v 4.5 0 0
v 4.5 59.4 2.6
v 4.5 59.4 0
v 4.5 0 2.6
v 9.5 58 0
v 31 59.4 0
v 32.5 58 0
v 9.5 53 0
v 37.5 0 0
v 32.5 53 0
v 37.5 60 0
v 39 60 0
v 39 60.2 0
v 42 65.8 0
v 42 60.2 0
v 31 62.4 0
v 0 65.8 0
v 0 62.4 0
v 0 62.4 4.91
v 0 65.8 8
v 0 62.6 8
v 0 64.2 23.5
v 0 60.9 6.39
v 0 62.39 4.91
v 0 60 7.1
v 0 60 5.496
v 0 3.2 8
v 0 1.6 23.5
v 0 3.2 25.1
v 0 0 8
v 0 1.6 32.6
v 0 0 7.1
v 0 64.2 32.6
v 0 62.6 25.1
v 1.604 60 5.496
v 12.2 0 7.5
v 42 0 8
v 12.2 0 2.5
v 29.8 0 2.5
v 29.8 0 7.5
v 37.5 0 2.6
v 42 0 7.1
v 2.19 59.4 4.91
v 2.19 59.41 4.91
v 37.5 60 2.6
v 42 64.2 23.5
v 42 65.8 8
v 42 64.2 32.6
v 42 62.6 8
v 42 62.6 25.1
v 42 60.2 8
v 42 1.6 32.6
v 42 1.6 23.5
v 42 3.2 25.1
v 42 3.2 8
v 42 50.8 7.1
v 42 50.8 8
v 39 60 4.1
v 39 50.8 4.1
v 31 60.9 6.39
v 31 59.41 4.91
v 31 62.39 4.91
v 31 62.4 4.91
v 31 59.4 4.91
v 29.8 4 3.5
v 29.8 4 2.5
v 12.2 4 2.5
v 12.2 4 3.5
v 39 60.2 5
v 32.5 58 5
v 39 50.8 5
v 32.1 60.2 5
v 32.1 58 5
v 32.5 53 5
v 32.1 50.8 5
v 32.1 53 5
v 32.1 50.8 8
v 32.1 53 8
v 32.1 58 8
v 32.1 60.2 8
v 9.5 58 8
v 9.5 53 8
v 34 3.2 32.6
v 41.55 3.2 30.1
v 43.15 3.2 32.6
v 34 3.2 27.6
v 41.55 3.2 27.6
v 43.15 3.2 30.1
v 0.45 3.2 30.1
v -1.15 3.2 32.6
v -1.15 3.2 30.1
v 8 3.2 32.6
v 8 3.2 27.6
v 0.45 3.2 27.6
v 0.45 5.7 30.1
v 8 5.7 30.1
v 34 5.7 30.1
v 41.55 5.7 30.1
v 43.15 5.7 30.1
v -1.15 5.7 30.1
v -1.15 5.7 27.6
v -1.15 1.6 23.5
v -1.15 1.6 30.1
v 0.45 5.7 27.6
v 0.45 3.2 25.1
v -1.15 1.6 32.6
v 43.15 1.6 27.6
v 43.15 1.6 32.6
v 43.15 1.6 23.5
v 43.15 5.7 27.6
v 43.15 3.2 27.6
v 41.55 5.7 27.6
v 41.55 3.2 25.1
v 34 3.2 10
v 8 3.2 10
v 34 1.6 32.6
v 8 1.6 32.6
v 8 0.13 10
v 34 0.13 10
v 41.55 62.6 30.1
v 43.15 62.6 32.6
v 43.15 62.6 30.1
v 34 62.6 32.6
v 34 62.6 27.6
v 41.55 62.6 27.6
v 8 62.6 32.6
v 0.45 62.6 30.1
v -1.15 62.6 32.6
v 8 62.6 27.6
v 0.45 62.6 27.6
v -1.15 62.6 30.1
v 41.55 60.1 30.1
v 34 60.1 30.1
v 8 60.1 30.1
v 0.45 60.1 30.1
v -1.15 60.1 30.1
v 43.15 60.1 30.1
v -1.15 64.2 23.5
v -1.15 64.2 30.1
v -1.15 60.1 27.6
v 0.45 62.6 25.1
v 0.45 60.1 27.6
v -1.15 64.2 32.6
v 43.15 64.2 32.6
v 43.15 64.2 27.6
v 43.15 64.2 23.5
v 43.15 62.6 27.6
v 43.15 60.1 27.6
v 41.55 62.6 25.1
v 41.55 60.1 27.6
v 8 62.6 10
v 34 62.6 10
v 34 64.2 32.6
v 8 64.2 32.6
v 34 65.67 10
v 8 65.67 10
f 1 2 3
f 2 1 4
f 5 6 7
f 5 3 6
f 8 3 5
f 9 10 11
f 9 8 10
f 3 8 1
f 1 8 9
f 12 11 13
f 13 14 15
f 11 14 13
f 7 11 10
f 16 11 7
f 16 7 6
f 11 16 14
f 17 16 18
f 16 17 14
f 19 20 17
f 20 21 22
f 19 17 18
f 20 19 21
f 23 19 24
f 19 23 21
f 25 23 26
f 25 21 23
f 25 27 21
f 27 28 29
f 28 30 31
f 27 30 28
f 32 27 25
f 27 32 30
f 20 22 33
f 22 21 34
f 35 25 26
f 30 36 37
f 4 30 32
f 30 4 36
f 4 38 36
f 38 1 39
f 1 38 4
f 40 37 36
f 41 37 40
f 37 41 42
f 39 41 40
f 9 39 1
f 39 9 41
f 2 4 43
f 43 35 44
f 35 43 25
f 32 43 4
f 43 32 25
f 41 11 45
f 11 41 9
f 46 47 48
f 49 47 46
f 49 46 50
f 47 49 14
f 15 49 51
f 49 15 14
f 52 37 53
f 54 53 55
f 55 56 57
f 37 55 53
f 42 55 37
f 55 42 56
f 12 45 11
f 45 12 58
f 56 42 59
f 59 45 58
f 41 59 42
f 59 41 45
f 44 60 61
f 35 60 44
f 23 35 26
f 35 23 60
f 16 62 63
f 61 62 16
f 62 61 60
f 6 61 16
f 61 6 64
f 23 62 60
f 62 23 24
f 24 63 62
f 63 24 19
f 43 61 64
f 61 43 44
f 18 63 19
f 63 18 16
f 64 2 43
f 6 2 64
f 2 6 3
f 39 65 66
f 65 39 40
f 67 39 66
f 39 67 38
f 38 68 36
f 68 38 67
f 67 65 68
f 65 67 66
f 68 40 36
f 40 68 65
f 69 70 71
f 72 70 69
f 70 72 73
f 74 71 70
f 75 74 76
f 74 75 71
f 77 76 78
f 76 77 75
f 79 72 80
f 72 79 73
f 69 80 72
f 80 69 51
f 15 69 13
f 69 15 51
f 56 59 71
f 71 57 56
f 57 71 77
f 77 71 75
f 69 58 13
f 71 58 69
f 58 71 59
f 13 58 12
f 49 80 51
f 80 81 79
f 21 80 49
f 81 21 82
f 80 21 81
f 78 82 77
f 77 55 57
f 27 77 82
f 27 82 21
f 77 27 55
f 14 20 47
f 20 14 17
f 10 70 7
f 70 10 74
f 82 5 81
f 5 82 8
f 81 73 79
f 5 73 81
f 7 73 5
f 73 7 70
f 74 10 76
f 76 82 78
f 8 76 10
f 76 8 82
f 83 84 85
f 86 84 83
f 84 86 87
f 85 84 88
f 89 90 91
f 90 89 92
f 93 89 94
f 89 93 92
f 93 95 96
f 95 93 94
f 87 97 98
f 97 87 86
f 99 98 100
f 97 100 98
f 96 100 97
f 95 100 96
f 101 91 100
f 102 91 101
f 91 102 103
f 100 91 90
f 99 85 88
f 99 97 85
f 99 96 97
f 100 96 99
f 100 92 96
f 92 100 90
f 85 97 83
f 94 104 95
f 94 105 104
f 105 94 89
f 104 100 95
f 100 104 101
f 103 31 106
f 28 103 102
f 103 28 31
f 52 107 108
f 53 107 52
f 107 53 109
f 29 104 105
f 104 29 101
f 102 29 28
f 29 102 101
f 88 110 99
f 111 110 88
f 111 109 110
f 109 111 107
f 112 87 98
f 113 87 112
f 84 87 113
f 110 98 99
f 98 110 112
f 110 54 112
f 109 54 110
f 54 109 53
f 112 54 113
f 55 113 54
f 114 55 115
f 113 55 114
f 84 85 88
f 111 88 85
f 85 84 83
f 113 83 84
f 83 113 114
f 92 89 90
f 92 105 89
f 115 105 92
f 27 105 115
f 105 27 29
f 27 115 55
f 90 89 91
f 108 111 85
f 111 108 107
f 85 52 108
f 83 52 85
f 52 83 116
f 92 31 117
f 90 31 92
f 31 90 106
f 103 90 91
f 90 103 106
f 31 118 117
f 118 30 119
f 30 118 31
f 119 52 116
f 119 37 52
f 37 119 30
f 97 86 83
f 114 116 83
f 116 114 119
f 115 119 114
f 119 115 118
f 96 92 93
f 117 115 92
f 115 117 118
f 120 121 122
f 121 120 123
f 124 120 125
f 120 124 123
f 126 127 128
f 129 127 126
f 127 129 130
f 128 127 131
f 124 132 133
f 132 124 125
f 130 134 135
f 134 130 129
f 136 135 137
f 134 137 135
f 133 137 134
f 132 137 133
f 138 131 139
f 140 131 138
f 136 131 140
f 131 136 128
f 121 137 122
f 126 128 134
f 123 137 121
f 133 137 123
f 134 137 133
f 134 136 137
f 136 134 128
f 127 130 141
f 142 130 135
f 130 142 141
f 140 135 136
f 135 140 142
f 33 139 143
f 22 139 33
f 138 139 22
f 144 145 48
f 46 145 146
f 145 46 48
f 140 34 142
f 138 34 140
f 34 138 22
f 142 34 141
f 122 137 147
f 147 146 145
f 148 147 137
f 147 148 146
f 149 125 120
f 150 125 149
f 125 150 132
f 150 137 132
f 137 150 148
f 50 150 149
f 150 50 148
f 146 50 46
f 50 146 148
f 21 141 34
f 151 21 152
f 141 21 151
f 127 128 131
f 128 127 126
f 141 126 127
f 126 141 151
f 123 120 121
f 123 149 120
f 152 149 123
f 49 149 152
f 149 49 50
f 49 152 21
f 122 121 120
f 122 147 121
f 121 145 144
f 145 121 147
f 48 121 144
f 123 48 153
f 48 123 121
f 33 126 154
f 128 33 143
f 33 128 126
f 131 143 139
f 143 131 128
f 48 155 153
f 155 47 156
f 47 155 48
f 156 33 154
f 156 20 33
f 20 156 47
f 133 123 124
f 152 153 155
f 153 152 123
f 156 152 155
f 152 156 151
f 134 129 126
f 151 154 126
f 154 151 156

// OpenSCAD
/*
Generic Action Camera Adapter for 3DR Solo
Copyright (C) 2016 - 2017  Hugh Eaves

This program is free software: you can redistribute it and/or modify
it under the terms of the GNU General Public License as published by
the Free Software Foundation, either version 3 of the License, or
(at your option) any later version.

This program is distributed in the hope that it will be useful,
but WITHOUT ANY WARRANTY; without even the implied warranty of
MERCHANTABILITY or FITNESS FOR A PARTICULAR PURPOSE.  See the
GNU General Public License for more details.

You should have received a copy of the GNU General Public License
along with this program.  If not, see <http://www.gnu.org/licenses/>.
*/

/************************************************
 * PART SELECTION
 ************************************************/
 
// Select the part you would like to display
part = "adapter"; // [adapter:Adapter,retaining_clip:Retaining clip,back_weight:Back Weight,side_weight:Side Weight]

/********************
 * MAIN PARAMETERS *
 ********************/

// No-name SJ4000 clone
// camera_length = 59.8;
// camera_width = 40.8;
// camera_height = 25.6;

// The values below are for the GitUp Git2P

/* [Adapter Parameters] */
// Length of camera body (side to side)
camera_length = 59.4; // [57:62]
// Width of camera body (top to bottom)
camera_width = 41.1;  // [38:42]
// Height of camera body (front to back)
camera_height = 19.6;  // [15:40]

// Adapter arm bump size (How far out the "bumps" protrude on the ends of the arms)
adapter_arm_bump_size = 2.5; // [1:5]

/* [Back Weight Parameters] */
// The length of the counterbalance weight on the back of the camera. Larger values make it heavier.
back_weight_length = 29; // [10:40]

// The offset of the weight on the back of the gimbal. Values greater than zero move the weight to the outer side of the gimbal
back_weight_offset = 0; // [0:20]

/* [Side Weight Parameters] */
// The thickness of the side weight, thicker is heavier
side_weight_thickness = 4; // [4:8]

// The length of the side weight, longer is heavier
side_weight_length = 10; // [9:17]

/********************
 * OTHER PARAMETERS *
 ********************/
/* [Hidden] */

/* How much to shift the camera to the right to avoid the curved protrusion from the pitch motor housing */
camera_offset = 3.2;

/* Dimensions of the base of the camera adapter, so that it is a nice snug fit inside the 3DR gimbal mount */
base_height = 8;  // (thickness) thick enough to clear the GoPro plug in the back
base_width  = 42;
base_length = 60;

/* Dimensions of the small bracket that holds the camera adapter to the gimbal mount */
bracket_width = 9;
bracket_depth = 9.5;
bracket_thickness = 3;
bracket_radius = 2;

/* Typical values for M2 cap-head screws */
screw_thread_diameter = 2.5;
screw_head_diameter = 5;
screw_head_height = 3;

/* Dimensions of the "stud" that the 3DR balancing weights attach to */
stud_height = 2.5;
stud_diameter = 6.4;
stud_hole_diameter = 2;

bottom_lip_width = 4.5;
bottom_lip_height = 2.6;

// cutout for GoPro plug
plug_thickness = 5;
plug_width = 23;
plug_offset = 55.5 - (plug_thickness / 2);

// cutout for right side wall of "gimbal bracket"
side_wall_length = 31;
side_wall_height = 6.4;
side_wall_width = 3;
side_wall_offset = 59.4;

// height of hook on bottom left of "gimbal bracket"
hook_width = 17.6;
hook_height = 2.5; // distance from bottom
hook_length = 4;
hook_thickness = 1;

// width of protrusion on front of "pitch motor"
motor_protrusion_width = 20;

// thickness / length of camera retaining clips
clip_thickness = 1.6;
right_clip_opening_width =  26;
// left_clip_opening_width = motor_protrusion_width;
left_clip_opening_width = right_clip_opening_width;

x_midpoint = base_width / 2;
main_length = camera_length + camera_offset * 2;
camera_gap = (base_width - camera_width) / 2;

camera_height_adjustment = 0;

// more facets for smaller holes
$fn=16;

module lip_cutout() {
cube([bottom_lip_width, base_length, bottom_lip_height]);
  translate([0,0,bottom_lip_height])
  mirror([1,-1,0])
  wedge(base_length, bottom_lip_width, bottom_lip_width, false, false);
}


module side_wall_cutout() {
   translate ([0, side_wall_offset, 0]) {
      cutout_base_height = side_wall_height - (side_wall_width / 2);
      cube([side_wall_length, side_wall_width, cutout_base_height + 0.01]);
        translate([0,0,cutout_base_height])
        prism (side_wall_length, side_wall_width, side_wall_width / 2- 0.01);
    }
}

module hook_cutout() {
  translate ([x_midpoint - hook_width/2 ,0,hook_height]) {
    cube([hook_width,hook_length,hook_thickness]);
    translate([0,0,hook_thickness])
      wedge (hook_width, hook_length, hook_length, false); 
  }
}

module bracket_cutout() {
  bracket_clearance = 0.4;
  adj_bracket_width = bracket_width + bracket_clearance;
  adj_bracket_depth = bracket_depth + bracket_clearance;
  translate([base_width - bracket_depth, base_length + bracket_clearance / 2 - adj_bracket_width, 0]) {
    translate([-bracket_clearance,0,base_height - bracket_thickness])
      cube([adj_bracket_depth,adj_bracket_width,bracket_thickness + 5]);
    translate([bracket_depth - bracket_thickness,0,0])
      cube([bracket_depth,adj_bracket_width,base_height]);
  }

}

module clip_corner(length) {
    
  cube([clip_thickness, length + clip_thickness, length]);
    wedge(clip_thickness, length + clip_thickness, length + clip_thickness, false, true);
      
}


module clip(length) {
  cube([base_width,clip_thickness,camera_height]);
  translate([-clip_thickness + camera_gap,0,camera_height])
  cube([camera_width+clip_thickness*2,clip_thickness,length * 2 + camera_height_adjustment]);
  translate ([-clip_thickness + camera_gap, clip_thickness, camera_height + camera_height_adjustment])
    mirror([0,1,-1])
      prism(camera_width+clip_thickness*2,length*2,length);
 //   cube([camera_width+clip_thickness*2, length + clip_thickness, clip_thickness ]);
  wedge(base_width,camera_offset - clip_thickness,camera_height+ length * 2 + camera_height_adjustment, true, false);
  translate([0,0,camera_height + adapter_arm_bump_size + camera_height_adjustment - length]) {
  translate([-clip_thickness + camera_gap,0,0]) clip_corner(length);
  translate([base_width - camera_gap,0,0]) clip_corner(length);
  }
}

module left_clip() {
  translate ([0,camera_offset - clip_thickness,base_height]) {
    difference() {
      clip(adapter_arm_bump_size);
      translate ([x_midpoint - left_clip_opening_width / 2,-clip_thickness,2])
        cube([left_clip_opening_width,adapter_arm_bump_size + clip_thickness * 2,camera_height+adapter_arm_bump_size*2]);
    }
  }
}

module right_clip() {
  translate ([0,camera_length + camera_offset + clip_thickness,base_height]) {
    mirror ([0,1,0]) difference() {
      clip(adapter_arm_bump_size);
      translate ([x_midpoint - right_clip_opening_width / 2,-clip_thickness,2])
        cube([right_clip_opening_width,adapter_arm_bump_size + clip_thickness * 2,camera_height+adapter_arm_bump_size*2]);
    }
  }
}
     
module prism(x, y, z, upside_down){
  translate([0,y/2,0]) {
  wedge(x, y/2, z, true, upside_down);
  wedge(x, y/2, z, false, upside_down);
  }
}

module wedge(x, y, z, reverse, upside_down){
  ly = reverse ? -y : y;
  lz = upside_down ? -z : z;
  polyhedron(
    points=[[0,0,0], [x,0,0], [x,ly,0], [0,ly,0], [0,0,lz], [x,0,lz]],
    faces=[[0,1,2,3],[5,4,3,2],[0,4,5,1],[0,3,4],[5,2,1]]
  );
}

module weight_stud() {
  difference() {
    cylinder(d=stud_diameter - 0.4, h=stud_height, $fn=32);
    cylinder(d=stud_hole_diameter, h=stud_height, $fn=16);
  }
}


/********************************************
 * Top level function to render the adapter
 ********************************************/
module adapter() {

  difference () {
    cube([base_width, main_length, base_height]);
    
    lip_cutout();
    
    translate([base_width,0,0]) mirror([-1,0,0]) lip_cutout();
    
    side_wall_cutout();

    translate ([x_midpoint - plug_width/2, plug_offset ,0])
      cube([plug_width, plug_thickness, base_height]);

    hook_cutout();
    
    bracket_cutout();
  }
  
  left_clip();
  right_clip();
  
}

/********************************************
 * Top level function to render the retaining clip
 ********************************************/
module retaining_clip() {
  bracket_inside_height = 11.4 + base_height - bracket_thickness;

  difference() {
    union() { 
      hull() { 
        cube([bracket_width, bracket_thickness, bracket_depth + bracket_thickness - bracket_radius]);
        cube([1, bracket_thickness, bracket_depth + bracket_thickness]);
        translate([bracket_width - bracket_radius,0,bracket_depth + bracket_thickness - bracket_radius])
          mirror ([0,-1,1]) cylinder(r = bracket_radius, h = bracket_thickness);
      }    
      translate([0, bracket_inside_height + bracket_thickness, 0]) 
        cube([bracket_width, bracket_thickness, bracket_depth + bracket_thickness]);
      translate([0, bracket_thickness, 0]) 
        cube([bracket_width, bracket_inside_height, bracket_thickness * 2]);
    }
    
    translate([bracket_width - 3,bracket_thickness,bracket_thickness - 0.2])
    cube([2,bracket_inside_height,bracket_depth]);
    translate ([bracket_width - 3.6,0,bracket_depth + bracket_thickness - 2.8])
      mirror ([0,-1,1]) {
        translate([0,0,-bracket_thickness/2])
          cylinder(d = 4, h = bracket_thickness);
        translate([0,0,bracket_thickness / 2])
          cylinder(d = 2, h = bracket_thickness);
    }
  }
}

/********************************************
 * Top level function to render the back / counterbalance weight
 ********************************************/
module back_weight() {
  thickness = 2;
  length = 57.8;
  width = 34;
  weight_thickness = 100;
  
  intersection() {
    difference() {
      union() {
        cube([length, width, thickness]);
        translate([back_weight_offset, 0, -weight_thickness])
          cube([back_weight_length, width, weight_thickness]);
        translate([12, 0, thickness])
          cube([3, width, 3.4]);
        translate([33.6, 0, thickness])
          cube([3, width, 4]);
        translate([54.8, 8, thickness])
          cube([3, width - 8, 4]); 
        
       translate([36, 0, 0]) {
        translate([4.5, 18, -2])
          cylinder(d = 5, h = 2);
        translate([16.5, 6.75, -2])
          cylinder(d = 5, h = 2);
        translate([13.5, 27, -2])
          cylinder(d = 5, h = 2);
       }

      }
      translate([36, 0, 0]) {
        translate([4.5, 18, -90])
          cylinder(d = screw_thread_diameter, h = 100);
        translate([16.5, 6.75, -90])
          cylinder(d = screw_thread_diameter, h = 100);
        translate([13.5, 27, -90])
          cylinder(d = screw_thread_diameter, h = 100);
      } 

    }
    mirror([-1, 0, 1])
      translate([26, width / 2, 0]) {
        cylinder(d = 77, h = 14, $fn = 64);
        translate([0, 0, 14])
          cylinder(d = 70, h = 16, $fn = 64);
        translate([0, 0, 30])
          cylinder(d = 77, h = 100, $fn = 64);
      }
  }
}

module curve_cutout(beam_curve_diameter, beam_thickness) {
  difference() {
    cylinder(d = beam_curve_diameter, h = 100, $fn = 64);
    cylinder(d = beam_curve_diameter - (beam_thickness * 2), h = 100, $fn = 64);
  }
}

/********************************************
 * Top level function to render the side weight
 ********************************************/
module side_weight() {
  
  side_weight_width = 2;

  beam_curve_diameter = 34;
  beam_thickness = 1.2;
  beam_height = 4;
  beam_width = 5.7;
  beam_length = beam_curve_diameter / 2;

  bracket_length = beam_length;
  bracket_width = beam_width + side_weight_width + beam_thickness;
  bracket_height = beam_height + side_weight_thickness;
  bracket_depth = 3;
  
  difference() {
    union() {
      difference() {
            cube([bracket_length, bracket_width, bracket_height]);
        
        translate([0, beam_curve_diameter / 2 + side_weight_width, side_weight_thickness])
          curve_cutout(beam_curve_diameter, beam_thickness);
        
        translate([bracket_length - screw_head_diameter / 2- 1,bracket_width / 2 - 1, 0]){ 
          
          cylinder(d = screw_head_diameter, h = screw_head_height);
          cylinder(d = screw_thread_diameter, h = bracket_height);
        }
      }
      translate([-side_weight_length, 0, 0])
        difference() {
          cube([side_weight_length, bracket_width, bracket_height]);
          
         translate([0, side_weight_width, side_weight_thickness])
            cube([side_weight_length, beam_thickness, 100]);
        }
    }
  }
}

// Call the top level rendering function based on "part"
if (part == "adapter") {
		adapter();
} else if (part == "back_weight") {
		back_weight();
} else if (part == "retaining_clip") {
		retaining_clip();
} else if (part == "side_weight") {
		side_weight();
    translate([0,20,0]) mirror([1,0,0]) side_weight();
}
